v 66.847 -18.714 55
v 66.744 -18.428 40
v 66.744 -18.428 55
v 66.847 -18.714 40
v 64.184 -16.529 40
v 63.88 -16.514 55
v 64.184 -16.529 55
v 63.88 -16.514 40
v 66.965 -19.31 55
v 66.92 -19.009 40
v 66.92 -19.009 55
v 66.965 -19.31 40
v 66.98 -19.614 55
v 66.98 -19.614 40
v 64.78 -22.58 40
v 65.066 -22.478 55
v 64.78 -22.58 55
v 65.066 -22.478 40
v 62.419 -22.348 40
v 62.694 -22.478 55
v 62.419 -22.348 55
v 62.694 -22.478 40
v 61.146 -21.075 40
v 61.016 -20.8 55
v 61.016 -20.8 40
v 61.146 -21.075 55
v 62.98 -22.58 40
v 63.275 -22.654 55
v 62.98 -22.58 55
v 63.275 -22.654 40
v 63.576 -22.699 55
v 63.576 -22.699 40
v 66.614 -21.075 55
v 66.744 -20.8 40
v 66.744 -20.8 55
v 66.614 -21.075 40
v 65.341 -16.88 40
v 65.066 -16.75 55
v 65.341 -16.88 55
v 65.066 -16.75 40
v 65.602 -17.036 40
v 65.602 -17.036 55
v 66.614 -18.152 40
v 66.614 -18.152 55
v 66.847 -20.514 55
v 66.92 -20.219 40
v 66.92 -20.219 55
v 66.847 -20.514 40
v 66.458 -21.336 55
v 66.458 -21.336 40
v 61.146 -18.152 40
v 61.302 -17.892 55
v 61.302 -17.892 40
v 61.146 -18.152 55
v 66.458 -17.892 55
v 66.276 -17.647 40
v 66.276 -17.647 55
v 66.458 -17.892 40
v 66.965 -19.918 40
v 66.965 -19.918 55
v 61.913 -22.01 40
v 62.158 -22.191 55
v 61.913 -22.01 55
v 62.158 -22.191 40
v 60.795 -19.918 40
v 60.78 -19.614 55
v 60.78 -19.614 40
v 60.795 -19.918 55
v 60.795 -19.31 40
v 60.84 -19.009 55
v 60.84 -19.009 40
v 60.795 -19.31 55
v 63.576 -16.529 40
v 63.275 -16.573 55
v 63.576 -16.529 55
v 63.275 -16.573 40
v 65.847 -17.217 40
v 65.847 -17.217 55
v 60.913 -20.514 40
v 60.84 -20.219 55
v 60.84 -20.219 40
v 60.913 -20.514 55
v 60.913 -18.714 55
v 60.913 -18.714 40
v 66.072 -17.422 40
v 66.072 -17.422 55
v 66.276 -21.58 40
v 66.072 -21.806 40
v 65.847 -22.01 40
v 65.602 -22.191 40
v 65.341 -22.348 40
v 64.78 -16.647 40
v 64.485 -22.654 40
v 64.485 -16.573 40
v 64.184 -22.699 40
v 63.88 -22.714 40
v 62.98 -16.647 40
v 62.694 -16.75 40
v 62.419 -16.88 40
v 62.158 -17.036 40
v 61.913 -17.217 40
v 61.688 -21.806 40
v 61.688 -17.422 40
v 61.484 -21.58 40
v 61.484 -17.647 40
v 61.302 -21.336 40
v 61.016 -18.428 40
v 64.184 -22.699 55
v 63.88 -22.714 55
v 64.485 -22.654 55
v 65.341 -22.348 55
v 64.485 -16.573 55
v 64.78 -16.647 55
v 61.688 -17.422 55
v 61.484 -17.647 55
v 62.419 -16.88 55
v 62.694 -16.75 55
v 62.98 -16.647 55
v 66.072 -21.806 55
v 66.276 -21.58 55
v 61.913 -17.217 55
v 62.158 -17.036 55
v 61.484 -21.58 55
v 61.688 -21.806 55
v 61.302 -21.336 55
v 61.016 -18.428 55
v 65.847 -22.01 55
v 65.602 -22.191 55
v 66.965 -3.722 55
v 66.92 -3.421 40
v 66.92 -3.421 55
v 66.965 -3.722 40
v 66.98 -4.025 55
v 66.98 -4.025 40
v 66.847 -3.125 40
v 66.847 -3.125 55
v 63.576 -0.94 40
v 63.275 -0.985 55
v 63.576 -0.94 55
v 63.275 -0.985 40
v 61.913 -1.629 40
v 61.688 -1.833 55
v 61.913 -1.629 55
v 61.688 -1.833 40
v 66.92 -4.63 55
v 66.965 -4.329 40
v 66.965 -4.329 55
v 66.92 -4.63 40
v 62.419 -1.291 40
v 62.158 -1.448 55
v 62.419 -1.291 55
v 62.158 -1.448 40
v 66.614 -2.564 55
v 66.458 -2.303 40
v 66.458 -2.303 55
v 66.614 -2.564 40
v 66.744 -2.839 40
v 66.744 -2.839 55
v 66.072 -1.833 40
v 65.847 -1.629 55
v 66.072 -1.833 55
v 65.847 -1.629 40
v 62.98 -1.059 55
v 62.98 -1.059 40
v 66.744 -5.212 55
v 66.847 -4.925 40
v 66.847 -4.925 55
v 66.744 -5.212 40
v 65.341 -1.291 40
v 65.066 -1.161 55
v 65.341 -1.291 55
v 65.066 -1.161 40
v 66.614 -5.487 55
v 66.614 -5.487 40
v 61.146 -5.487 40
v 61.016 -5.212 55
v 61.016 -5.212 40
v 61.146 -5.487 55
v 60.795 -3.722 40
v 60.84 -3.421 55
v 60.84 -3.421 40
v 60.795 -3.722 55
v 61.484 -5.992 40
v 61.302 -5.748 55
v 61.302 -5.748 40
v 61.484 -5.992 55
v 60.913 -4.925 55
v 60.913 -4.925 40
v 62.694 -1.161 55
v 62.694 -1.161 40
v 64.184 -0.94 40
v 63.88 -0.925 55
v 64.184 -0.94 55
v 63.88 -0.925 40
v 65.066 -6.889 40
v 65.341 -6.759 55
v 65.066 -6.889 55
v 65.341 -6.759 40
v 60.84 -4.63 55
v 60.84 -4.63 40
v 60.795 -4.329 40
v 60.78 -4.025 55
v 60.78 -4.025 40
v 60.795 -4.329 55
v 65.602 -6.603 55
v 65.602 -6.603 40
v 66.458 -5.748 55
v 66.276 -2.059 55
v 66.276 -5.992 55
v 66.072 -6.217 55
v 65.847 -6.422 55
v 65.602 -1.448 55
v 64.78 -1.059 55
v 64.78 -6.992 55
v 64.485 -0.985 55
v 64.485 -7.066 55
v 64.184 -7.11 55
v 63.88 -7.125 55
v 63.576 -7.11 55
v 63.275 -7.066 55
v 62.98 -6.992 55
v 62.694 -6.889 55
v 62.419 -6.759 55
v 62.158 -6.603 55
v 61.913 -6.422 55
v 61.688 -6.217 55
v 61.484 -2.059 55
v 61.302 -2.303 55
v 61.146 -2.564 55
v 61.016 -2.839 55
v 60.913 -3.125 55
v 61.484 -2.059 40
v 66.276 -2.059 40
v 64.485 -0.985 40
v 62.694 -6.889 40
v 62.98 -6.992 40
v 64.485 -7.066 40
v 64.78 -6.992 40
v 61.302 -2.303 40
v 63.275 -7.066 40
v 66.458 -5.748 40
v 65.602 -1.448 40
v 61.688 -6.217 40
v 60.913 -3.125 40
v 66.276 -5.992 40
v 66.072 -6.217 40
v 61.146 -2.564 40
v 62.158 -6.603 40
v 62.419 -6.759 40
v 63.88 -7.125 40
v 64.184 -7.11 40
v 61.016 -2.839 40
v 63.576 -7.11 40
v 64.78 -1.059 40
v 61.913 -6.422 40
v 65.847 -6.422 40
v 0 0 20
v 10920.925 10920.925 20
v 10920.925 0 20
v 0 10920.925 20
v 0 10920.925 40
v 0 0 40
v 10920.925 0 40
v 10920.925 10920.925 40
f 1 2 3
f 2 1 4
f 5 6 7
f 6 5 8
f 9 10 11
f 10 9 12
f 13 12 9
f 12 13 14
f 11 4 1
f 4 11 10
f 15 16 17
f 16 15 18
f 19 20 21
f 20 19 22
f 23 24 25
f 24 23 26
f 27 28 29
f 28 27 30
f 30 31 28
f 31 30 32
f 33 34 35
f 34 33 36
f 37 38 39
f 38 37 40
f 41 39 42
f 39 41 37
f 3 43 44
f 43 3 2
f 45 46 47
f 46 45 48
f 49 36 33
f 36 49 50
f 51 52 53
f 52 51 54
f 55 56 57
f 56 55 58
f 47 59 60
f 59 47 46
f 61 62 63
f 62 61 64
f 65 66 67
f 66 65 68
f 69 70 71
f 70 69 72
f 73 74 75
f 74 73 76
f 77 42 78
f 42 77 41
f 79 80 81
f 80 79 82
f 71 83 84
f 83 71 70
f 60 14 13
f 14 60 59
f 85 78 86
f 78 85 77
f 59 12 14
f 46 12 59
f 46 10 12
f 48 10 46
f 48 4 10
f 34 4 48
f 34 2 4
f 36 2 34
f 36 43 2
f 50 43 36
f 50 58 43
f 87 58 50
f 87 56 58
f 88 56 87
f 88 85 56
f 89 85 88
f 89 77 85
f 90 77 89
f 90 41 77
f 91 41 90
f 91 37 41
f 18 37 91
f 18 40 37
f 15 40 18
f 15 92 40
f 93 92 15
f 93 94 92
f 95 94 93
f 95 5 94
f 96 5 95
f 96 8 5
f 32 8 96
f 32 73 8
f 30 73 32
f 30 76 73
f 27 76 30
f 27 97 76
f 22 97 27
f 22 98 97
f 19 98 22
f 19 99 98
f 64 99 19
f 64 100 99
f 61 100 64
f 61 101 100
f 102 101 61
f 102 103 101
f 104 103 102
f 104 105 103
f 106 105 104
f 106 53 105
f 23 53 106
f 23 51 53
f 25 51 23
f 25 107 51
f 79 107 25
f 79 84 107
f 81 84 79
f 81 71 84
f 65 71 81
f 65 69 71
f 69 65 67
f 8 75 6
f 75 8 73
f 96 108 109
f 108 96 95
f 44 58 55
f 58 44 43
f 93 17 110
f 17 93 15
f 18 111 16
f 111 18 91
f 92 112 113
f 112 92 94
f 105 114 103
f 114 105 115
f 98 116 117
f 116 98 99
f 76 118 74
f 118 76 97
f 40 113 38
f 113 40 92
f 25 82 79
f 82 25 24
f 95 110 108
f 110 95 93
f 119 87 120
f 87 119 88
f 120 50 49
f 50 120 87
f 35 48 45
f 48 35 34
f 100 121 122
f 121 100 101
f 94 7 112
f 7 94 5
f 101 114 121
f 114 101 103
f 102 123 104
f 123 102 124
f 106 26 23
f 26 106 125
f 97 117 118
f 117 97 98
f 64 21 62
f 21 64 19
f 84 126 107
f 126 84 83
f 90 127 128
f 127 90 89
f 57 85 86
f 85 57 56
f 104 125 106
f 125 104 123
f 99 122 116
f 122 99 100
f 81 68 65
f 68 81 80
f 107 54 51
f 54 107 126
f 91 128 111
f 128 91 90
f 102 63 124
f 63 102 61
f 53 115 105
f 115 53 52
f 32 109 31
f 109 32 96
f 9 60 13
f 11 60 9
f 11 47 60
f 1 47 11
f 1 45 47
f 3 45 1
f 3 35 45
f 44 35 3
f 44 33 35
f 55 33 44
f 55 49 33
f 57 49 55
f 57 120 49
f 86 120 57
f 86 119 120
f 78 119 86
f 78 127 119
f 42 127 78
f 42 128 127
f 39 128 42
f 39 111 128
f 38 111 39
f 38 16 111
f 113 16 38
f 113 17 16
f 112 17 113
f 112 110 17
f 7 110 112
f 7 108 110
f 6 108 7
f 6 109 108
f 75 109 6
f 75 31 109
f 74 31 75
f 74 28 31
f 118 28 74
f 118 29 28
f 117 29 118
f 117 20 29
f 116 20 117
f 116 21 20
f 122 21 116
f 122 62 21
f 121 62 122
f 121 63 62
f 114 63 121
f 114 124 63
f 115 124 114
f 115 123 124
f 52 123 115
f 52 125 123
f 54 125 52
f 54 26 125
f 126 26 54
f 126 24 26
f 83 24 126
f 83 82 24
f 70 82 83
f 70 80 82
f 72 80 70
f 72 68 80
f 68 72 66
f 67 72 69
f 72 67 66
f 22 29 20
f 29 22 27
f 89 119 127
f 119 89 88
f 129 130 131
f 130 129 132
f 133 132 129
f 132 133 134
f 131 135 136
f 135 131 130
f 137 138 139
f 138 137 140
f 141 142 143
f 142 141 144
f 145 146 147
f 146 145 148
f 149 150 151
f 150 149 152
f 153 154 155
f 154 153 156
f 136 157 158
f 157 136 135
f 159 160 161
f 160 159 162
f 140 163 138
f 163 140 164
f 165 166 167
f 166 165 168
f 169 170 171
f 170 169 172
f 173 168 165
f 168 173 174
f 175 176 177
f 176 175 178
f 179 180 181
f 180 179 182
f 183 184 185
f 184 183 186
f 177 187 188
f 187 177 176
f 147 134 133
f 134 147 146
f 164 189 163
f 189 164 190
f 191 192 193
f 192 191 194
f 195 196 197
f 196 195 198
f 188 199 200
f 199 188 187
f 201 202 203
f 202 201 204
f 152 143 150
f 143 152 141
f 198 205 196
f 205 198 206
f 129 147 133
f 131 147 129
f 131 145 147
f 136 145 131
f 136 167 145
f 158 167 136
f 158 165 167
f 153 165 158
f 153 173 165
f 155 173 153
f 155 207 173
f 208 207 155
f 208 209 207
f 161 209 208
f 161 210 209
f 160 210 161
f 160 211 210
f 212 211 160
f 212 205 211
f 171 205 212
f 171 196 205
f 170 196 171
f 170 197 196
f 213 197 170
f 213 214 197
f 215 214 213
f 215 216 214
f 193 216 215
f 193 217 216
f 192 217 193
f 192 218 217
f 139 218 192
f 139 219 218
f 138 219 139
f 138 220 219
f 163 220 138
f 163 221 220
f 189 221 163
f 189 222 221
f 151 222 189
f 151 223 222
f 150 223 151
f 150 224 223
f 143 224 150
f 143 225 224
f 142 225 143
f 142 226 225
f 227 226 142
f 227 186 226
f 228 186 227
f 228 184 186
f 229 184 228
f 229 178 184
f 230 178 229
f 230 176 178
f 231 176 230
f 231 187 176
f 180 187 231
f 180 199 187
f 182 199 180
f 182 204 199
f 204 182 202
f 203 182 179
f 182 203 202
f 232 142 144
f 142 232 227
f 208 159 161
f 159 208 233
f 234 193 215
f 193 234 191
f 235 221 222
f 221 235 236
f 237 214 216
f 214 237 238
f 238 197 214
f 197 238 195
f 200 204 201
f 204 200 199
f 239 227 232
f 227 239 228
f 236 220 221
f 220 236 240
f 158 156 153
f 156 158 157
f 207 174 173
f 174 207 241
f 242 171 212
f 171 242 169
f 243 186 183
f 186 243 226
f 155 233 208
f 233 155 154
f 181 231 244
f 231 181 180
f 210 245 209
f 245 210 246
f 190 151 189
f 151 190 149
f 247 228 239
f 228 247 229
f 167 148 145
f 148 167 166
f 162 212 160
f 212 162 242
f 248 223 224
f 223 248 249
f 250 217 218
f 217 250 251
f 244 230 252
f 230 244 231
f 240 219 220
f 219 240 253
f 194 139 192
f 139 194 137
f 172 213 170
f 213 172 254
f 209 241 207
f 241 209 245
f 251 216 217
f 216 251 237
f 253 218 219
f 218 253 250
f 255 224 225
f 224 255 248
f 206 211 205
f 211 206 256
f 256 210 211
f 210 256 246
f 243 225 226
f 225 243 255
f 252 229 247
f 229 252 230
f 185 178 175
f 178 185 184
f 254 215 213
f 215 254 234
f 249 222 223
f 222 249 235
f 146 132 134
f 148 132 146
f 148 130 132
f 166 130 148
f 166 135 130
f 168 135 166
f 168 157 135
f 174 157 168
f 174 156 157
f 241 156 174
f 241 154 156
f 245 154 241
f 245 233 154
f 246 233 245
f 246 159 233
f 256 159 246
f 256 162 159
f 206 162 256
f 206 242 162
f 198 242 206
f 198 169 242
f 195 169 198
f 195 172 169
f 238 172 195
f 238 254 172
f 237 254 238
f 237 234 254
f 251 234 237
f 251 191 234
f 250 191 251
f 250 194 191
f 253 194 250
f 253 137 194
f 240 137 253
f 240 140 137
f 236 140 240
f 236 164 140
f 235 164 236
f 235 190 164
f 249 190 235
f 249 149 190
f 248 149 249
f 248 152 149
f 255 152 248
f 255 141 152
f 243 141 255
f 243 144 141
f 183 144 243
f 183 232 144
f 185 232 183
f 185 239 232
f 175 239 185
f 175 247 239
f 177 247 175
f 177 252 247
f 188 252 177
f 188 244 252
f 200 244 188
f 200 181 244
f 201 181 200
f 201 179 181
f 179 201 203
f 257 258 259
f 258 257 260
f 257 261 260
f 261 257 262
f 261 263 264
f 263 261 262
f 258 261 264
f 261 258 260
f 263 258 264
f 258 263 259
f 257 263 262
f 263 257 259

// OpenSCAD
// Dimensions in mm
X = 127.76;
Y = 85.48;
Z = 20;

// Hole dimensions and grid parameters
hole_diameter = 6.2;
hole_spacing_x = 9.0;
hole_spacing_y = hole_spacing_x * sqrt(3);
num_rows = 8;
num_cols = 12;
first_hole_x = (X - num_cols * hole_spacing_x) / 2;
first_hole_y = (Y - num_rows * hole_spacing_y) / 2;

// Chamfer dimensions
chamfer_leg_length = 5.0;
chamfer_angle = 45;

// Build the rack
translate([0, 0, Z]) {
    // Top and bottom plates
    linear_extrude(Z) {
        square(X * Y);
    }
    
    // Vertical edges with chamfers
    for (y = [0, hole_spacing_y]) {
        translate([first_hole_x + num_cols * hole_spacing_x / 2, first_hole_y + y, Z])
            rotate_extrude(45) {
                linear_extrude(Z - chamfer_leg_length)
                    square(chamfer_leg_length);
            }
    }

    // Vertical through-holes
    for (y = [0, hole_spacing_y]) {
        translate([first_hole_x + num_cols * hole_spacing_x / 2, first_hole_y + y, Z])
            cylinder(h = Z - chamfer_leg_length, r = hole_diameter / 2, $fn = 64);
    }

    // Orientation mark at A1 corner
    translate([first_hole_x + num_cols * hole_spacing_x / 2 - chamfer_leg_length / 2, first_hole_y + num_rows * hole_spacing_y / 2, Z])
        rotate_extrude(45) {
            linear_extrude(Z - chamfer_leg_length)
                square(chamfer_leg_length);
        }
}
